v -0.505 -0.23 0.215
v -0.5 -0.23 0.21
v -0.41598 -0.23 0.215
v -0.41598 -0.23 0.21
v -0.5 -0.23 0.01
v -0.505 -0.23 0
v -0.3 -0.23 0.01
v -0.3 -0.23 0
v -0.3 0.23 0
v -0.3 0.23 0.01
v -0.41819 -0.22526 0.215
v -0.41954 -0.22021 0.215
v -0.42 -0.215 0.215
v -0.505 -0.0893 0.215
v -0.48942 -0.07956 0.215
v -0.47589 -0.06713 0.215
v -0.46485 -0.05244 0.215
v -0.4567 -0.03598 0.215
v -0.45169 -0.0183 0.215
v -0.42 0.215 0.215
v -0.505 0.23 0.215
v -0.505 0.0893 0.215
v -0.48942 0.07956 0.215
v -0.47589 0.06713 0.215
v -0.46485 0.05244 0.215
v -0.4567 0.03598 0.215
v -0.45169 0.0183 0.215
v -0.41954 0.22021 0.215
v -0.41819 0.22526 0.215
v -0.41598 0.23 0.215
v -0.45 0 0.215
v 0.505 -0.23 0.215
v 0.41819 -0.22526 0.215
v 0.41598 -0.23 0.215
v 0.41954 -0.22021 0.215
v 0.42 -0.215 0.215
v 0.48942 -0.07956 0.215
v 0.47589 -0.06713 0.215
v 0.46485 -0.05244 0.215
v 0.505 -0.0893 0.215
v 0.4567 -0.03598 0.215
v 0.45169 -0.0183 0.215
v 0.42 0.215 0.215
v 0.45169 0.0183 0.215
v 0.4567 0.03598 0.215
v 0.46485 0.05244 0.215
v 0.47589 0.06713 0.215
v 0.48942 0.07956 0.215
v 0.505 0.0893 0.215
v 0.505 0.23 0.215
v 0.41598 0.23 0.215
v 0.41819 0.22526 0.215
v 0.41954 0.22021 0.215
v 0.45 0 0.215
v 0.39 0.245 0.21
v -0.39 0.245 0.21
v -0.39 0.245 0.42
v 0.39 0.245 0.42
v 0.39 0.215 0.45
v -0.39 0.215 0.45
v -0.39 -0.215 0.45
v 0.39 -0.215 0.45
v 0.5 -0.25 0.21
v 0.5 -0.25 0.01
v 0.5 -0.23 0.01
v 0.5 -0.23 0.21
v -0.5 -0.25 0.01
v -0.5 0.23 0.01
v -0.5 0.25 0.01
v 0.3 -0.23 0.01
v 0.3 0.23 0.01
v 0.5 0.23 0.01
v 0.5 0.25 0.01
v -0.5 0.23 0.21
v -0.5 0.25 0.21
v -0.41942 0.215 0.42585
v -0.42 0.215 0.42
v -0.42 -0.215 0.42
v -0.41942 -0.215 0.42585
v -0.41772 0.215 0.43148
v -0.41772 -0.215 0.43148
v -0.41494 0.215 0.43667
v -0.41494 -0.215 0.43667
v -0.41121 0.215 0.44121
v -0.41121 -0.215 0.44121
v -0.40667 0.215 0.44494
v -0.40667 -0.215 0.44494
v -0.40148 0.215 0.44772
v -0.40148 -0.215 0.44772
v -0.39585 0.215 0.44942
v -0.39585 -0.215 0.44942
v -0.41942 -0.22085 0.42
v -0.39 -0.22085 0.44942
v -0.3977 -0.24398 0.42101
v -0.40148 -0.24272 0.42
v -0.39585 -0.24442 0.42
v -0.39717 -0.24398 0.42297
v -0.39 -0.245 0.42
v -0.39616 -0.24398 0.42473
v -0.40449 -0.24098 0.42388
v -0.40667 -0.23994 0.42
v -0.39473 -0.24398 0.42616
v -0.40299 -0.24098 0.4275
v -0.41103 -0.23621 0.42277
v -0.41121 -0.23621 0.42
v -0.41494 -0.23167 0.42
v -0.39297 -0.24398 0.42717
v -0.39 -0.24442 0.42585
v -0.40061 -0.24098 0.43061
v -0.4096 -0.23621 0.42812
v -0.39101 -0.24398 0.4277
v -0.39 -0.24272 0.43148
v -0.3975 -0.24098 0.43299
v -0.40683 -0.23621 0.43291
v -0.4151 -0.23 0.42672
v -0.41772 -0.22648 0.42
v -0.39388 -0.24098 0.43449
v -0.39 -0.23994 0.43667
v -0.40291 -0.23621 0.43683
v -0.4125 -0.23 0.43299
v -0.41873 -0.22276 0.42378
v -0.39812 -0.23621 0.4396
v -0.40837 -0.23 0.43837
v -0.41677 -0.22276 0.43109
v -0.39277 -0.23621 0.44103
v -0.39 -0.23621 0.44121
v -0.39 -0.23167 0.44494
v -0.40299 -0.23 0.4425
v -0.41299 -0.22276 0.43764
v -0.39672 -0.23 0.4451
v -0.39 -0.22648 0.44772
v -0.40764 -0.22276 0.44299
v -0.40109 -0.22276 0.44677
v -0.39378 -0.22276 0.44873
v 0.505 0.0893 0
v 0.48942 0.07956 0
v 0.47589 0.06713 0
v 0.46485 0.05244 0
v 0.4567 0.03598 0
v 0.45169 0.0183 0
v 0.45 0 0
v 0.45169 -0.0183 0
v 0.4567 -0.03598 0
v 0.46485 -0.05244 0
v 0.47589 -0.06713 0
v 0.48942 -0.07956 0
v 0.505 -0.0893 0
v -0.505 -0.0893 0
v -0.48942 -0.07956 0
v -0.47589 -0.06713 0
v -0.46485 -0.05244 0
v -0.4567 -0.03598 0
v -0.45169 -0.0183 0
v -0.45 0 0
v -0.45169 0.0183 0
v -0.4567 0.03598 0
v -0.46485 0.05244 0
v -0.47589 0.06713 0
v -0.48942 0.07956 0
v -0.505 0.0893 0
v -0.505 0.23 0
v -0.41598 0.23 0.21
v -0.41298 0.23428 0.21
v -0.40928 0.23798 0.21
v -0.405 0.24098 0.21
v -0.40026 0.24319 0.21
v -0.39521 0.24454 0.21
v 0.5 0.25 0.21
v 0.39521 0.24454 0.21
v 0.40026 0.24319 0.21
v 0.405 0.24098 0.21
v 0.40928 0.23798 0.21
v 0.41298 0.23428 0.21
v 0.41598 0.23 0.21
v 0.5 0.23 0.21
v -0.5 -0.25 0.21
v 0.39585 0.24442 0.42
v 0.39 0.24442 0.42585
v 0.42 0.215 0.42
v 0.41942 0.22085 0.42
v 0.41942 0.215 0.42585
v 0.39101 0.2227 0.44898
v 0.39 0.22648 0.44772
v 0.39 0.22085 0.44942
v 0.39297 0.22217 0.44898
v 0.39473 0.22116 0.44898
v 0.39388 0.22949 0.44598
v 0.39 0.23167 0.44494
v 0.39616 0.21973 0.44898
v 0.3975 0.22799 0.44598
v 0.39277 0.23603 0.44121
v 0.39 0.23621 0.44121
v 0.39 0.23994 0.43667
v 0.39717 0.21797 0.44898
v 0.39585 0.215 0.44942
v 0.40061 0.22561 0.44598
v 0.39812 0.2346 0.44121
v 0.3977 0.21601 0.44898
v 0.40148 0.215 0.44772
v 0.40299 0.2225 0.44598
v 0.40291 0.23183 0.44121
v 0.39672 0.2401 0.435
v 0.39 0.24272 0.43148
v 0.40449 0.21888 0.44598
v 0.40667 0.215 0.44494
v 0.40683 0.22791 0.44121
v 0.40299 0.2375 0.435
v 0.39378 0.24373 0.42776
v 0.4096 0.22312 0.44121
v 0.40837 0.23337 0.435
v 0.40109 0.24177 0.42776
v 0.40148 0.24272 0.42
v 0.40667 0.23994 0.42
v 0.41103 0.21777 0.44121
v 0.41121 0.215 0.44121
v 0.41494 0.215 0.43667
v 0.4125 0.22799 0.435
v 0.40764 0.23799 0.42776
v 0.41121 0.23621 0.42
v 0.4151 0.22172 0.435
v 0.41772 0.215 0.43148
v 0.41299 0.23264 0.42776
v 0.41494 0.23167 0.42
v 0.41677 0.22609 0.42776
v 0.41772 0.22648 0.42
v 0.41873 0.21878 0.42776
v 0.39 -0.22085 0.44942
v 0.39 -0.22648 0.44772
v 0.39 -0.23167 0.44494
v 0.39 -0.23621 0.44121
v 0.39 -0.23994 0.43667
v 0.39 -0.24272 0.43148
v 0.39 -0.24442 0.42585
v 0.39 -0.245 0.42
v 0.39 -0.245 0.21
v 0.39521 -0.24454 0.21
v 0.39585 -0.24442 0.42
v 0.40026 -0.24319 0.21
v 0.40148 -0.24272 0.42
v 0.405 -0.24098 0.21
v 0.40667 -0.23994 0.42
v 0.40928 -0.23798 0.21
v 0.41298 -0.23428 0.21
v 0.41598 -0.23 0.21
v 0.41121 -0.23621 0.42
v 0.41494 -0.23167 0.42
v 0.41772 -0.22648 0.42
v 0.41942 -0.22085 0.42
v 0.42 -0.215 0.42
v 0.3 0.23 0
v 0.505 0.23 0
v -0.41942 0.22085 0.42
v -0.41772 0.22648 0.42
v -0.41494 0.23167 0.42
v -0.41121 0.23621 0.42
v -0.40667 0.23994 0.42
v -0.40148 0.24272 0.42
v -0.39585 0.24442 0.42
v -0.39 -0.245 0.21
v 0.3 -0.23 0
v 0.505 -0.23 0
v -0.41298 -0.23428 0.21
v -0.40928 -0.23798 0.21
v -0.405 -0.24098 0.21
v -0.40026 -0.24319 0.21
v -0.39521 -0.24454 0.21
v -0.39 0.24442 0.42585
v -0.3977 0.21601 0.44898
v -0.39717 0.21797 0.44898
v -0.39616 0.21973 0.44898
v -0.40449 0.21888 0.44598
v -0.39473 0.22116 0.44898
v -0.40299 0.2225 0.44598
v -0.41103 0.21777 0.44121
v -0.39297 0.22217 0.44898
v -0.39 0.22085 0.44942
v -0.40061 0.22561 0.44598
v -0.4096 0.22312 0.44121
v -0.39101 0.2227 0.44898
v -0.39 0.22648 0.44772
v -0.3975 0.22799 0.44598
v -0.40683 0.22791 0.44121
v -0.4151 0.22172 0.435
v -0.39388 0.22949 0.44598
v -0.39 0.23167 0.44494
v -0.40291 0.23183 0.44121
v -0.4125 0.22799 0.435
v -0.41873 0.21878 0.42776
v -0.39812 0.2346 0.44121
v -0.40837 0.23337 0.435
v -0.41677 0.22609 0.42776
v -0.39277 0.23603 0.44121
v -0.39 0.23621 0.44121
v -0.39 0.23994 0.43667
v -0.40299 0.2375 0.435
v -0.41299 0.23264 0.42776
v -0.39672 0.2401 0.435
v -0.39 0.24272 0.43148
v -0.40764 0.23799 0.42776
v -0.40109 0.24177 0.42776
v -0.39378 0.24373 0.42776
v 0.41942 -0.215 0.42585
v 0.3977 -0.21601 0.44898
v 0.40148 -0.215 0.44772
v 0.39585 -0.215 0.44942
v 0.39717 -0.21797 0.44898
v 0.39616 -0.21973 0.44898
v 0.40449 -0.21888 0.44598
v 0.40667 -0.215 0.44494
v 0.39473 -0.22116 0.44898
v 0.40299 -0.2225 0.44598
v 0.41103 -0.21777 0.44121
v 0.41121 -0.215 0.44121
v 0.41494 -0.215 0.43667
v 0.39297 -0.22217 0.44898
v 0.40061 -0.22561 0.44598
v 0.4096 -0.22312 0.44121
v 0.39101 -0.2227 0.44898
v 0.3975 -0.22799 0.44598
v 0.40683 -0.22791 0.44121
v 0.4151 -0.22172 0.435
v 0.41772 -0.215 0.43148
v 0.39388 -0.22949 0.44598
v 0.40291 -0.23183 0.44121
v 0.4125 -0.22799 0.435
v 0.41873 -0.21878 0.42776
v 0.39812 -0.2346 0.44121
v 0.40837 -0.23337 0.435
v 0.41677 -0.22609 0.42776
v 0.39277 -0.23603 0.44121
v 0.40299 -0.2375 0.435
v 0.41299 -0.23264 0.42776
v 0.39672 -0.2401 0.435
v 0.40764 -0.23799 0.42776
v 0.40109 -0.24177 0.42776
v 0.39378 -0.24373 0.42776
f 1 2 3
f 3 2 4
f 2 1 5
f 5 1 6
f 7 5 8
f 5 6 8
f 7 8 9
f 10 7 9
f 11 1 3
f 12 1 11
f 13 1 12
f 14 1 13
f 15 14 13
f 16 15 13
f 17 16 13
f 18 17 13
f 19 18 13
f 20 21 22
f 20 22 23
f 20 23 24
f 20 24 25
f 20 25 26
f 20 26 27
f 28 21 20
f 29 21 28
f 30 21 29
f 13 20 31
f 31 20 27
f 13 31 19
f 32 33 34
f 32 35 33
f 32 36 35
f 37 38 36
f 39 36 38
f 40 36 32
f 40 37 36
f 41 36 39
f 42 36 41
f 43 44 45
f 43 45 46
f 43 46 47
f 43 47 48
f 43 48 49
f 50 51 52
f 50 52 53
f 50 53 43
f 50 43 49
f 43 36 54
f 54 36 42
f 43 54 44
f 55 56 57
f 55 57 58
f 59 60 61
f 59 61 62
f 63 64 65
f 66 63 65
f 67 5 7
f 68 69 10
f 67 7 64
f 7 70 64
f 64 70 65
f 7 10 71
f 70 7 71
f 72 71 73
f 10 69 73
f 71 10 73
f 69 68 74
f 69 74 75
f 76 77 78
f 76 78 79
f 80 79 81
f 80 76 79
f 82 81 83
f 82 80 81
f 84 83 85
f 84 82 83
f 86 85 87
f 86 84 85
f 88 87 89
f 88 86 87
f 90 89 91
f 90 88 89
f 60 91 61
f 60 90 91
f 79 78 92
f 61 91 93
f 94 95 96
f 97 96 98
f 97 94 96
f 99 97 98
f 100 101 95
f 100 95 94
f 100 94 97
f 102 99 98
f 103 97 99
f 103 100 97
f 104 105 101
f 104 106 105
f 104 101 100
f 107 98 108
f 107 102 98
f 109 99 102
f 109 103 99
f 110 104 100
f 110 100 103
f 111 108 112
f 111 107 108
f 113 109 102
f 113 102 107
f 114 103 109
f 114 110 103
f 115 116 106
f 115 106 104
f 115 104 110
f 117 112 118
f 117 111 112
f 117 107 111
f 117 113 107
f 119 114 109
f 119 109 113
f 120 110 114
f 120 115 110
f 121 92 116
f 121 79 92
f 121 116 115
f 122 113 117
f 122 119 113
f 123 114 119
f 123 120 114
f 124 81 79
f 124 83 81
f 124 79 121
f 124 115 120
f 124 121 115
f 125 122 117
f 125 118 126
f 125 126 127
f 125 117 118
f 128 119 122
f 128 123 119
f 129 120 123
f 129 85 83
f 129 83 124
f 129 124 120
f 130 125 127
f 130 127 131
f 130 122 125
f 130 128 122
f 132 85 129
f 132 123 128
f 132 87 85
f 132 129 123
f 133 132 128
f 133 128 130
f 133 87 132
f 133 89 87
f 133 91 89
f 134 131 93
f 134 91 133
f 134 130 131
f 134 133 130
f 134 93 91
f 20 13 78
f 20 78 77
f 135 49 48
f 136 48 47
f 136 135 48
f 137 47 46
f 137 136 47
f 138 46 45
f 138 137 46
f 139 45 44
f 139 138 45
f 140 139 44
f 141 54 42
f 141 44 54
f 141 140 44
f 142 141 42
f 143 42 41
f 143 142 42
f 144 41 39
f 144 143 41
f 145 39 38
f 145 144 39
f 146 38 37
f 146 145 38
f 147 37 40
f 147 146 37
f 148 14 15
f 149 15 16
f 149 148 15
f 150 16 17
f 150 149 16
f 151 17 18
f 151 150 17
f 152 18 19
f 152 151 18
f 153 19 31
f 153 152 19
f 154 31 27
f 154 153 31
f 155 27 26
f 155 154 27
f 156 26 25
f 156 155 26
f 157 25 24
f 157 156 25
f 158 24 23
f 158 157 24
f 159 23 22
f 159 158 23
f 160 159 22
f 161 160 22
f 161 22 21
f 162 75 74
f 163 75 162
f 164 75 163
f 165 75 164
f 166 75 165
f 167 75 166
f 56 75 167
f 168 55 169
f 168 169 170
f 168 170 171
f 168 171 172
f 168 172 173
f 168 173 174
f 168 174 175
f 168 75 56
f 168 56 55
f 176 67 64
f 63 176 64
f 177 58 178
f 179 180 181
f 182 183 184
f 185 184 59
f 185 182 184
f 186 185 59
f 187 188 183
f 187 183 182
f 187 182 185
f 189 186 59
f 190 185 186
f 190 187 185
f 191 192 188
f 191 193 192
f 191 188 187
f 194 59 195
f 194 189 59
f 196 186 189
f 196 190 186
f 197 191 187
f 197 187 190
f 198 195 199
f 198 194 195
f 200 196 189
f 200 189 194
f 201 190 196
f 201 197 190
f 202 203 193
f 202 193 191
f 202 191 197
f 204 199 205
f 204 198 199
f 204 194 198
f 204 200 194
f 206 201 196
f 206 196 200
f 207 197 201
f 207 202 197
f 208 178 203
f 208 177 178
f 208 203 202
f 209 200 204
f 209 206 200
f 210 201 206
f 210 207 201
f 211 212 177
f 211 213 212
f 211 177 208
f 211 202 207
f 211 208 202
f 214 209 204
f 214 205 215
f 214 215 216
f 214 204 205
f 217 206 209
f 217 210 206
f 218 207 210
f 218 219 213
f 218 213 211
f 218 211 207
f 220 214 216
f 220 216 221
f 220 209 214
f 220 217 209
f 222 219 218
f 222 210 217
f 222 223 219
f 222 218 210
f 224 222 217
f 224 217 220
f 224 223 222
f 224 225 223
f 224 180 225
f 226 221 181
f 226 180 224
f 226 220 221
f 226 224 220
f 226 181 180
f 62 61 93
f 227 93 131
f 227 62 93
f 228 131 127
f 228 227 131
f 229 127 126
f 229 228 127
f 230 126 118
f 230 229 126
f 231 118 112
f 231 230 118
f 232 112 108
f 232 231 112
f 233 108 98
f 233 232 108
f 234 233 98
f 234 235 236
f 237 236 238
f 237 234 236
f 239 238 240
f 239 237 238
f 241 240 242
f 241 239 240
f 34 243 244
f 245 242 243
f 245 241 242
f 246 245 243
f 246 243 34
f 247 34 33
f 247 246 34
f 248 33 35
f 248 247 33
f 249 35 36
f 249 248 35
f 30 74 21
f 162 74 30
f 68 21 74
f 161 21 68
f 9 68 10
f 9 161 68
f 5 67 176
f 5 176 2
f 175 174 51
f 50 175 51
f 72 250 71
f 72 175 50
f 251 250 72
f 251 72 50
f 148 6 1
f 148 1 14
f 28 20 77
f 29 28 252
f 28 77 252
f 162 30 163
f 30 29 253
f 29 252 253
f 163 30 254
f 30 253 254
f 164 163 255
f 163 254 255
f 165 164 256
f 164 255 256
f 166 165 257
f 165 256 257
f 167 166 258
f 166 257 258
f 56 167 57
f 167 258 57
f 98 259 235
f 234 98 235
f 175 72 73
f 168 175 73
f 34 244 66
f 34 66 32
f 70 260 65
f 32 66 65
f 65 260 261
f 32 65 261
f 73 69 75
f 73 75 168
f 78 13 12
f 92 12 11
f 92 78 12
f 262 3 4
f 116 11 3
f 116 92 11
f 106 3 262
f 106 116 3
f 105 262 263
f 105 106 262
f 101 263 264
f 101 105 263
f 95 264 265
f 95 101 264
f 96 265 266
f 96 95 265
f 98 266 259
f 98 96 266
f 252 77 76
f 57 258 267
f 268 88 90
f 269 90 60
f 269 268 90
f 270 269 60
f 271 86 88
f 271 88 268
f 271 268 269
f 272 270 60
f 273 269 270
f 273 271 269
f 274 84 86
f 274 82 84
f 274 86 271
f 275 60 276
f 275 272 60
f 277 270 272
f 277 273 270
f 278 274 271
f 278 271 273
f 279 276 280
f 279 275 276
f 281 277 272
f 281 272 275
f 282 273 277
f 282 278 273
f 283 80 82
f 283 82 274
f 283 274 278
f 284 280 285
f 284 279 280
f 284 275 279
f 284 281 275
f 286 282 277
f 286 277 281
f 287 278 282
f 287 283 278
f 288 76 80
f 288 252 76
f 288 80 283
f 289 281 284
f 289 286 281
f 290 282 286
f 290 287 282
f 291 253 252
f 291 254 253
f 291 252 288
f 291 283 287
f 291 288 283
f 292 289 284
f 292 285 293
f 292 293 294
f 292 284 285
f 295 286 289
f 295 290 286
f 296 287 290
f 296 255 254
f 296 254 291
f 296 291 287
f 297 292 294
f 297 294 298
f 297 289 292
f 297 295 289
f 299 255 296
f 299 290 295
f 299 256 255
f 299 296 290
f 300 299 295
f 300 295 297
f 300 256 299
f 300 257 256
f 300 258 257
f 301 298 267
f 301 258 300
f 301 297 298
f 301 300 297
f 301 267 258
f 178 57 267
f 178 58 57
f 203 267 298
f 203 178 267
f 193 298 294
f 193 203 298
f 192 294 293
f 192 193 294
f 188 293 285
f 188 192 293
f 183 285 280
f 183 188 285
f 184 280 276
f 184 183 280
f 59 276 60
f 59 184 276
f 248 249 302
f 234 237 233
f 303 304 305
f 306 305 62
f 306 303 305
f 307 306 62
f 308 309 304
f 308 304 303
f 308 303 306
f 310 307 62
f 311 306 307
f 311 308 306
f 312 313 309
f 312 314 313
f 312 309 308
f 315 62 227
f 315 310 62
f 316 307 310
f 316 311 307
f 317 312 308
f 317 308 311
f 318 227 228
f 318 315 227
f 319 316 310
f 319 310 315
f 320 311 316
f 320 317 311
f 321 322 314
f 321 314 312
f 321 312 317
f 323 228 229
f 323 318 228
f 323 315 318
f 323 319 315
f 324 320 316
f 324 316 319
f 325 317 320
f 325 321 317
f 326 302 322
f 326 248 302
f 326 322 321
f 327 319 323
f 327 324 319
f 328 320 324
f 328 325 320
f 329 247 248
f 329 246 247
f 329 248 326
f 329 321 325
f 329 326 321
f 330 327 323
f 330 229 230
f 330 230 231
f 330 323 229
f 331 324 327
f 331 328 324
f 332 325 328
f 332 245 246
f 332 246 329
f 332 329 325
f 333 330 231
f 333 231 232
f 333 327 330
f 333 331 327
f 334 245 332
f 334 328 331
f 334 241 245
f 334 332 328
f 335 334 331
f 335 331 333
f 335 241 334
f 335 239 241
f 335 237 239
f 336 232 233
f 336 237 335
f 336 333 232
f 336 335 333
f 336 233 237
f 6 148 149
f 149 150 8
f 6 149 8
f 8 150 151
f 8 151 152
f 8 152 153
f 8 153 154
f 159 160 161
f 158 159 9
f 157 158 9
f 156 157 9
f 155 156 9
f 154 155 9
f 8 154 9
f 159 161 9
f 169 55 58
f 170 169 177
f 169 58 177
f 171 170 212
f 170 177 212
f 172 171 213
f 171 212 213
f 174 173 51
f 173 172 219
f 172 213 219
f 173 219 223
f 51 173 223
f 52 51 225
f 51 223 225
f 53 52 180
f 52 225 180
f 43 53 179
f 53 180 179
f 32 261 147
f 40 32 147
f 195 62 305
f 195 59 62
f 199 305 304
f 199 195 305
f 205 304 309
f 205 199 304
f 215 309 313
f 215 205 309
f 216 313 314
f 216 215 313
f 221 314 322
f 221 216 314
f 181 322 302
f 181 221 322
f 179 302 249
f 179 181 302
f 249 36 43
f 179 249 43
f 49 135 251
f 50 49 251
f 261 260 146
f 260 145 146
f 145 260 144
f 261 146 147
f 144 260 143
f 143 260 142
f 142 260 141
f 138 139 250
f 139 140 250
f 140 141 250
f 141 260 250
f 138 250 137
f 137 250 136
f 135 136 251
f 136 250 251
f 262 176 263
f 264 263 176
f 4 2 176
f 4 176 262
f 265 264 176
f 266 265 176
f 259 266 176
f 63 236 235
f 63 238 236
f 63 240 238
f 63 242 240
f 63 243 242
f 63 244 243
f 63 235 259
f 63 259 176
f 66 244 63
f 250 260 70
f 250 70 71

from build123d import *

# Parameters (mm, degrees)
EXTRUDE_START       = 0.01
SKETCH_2_W          = 1
SKETCH_2_H          = 0.5
EXTRUDE_1_DEPTH     = 0.2
SKETCH_3_W          = 0.205
SKETCH_3_H          = 0.46
EXTRUDE_2_DEPTH     = 0.215
EXTRUDE_START_2     = 0.2
SKETCH_4_W          = 0.84
SKETCH_4_H          = 0.49
EXTRUDE_3_DEPTH     = 0.25
FILLET_1_R          = 0.03
SKETCH_6_R          = 0.1
CUT_EXTRUDE_2_DEPTH = 0.52


with BuildPart() as part:
    # Sketch 2 → Extrude 1 (new body)
    with BuildSketch(Plane.XY.offset(EXTRUDE_START)):
        Rectangle(SKETCH_2_W, SKETCH_2_H)
    extrude(amount=EXTRUDE_1_DEPTH)

    # Sketch 3 → Extrude 2 (add)
    with BuildSketch(Plane.XY):
        with Locations((-0.4025, 0)):
            Rectangle(SKETCH_3_W, SKETCH_3_H)
        with Locations((0.4025, 0)):
            Rectangle(SKETCH_3_W, SKETCH_3_H)
    extrude(amount=EXTRUDE_2_DEPTH)

    # Sketch 4 → Extrude 3 (add)
    with BuildSketch(Plane.XY.offset(EXTRUDE_START_2)):
        Rectangle(SKETCH_4_W, SKETCH_4_H)
    extrude(amount=EXTRUDE_3_DEPTH)

    # Fillet 1
    fillet_1_edges = [part.edges().sort_by_distance(p)[0] for p in [
        (-0.42, 0.245, 0.33),
        (-0.42, 0, 0.45),
        (-0.42, -0.245, 0.33),
        (0.42, 0.245, 0.33),
        (0, 0.245, 0.45),
        (0.42, -0.245, 0.33),
        (0.42, 0, 0.45),
        (0, -0.245, 0.45),
    ]]
    fillet(fillet_1_edges, radius=FILLET_1_R)

    # Sketch 6 → Cut-Extrude 2 (cut)
    with BuildSketch(Plane.XY):
        with Locations((-0.55, 0)):
            Circle(SKETCH_6_R)
        with Locations((0.55, 0)):
            Circle(SKETCH_6_R)
    extrude(amount=CUT_EXTRUDE_2_DEPTH, mode=Mode.SUBTRACT)


solid = part.part
